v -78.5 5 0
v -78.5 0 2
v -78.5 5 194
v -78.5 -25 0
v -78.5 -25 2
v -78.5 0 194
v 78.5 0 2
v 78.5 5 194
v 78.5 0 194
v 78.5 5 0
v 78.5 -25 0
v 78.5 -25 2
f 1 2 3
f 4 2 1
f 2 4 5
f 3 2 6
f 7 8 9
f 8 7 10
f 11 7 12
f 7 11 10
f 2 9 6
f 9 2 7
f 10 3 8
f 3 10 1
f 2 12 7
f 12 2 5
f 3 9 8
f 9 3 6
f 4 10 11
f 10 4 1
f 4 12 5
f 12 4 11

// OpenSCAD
$fa = 1;
$fs = 0.4;

img_width = 157;
img_height = 192;

back_thickness = 5;
base_width = img_width;
base_depth = 30;
base_thickness = 2;

translate([0, 0, base_thickness + img_height/2]) rotate([90, 0, 0]) {
    scale([1, 1, 0.125]) surface("dwayne-3d.png", center = true);

    translate([0, 0, -0.5*back_thickness]) cube([img_width, img_height, back_thickness], center=true);
}

translate([0, -base_depth/2+back_thickness, base_thickness/2]) cube([base_width, base_depth, base_thickness], center=true);
